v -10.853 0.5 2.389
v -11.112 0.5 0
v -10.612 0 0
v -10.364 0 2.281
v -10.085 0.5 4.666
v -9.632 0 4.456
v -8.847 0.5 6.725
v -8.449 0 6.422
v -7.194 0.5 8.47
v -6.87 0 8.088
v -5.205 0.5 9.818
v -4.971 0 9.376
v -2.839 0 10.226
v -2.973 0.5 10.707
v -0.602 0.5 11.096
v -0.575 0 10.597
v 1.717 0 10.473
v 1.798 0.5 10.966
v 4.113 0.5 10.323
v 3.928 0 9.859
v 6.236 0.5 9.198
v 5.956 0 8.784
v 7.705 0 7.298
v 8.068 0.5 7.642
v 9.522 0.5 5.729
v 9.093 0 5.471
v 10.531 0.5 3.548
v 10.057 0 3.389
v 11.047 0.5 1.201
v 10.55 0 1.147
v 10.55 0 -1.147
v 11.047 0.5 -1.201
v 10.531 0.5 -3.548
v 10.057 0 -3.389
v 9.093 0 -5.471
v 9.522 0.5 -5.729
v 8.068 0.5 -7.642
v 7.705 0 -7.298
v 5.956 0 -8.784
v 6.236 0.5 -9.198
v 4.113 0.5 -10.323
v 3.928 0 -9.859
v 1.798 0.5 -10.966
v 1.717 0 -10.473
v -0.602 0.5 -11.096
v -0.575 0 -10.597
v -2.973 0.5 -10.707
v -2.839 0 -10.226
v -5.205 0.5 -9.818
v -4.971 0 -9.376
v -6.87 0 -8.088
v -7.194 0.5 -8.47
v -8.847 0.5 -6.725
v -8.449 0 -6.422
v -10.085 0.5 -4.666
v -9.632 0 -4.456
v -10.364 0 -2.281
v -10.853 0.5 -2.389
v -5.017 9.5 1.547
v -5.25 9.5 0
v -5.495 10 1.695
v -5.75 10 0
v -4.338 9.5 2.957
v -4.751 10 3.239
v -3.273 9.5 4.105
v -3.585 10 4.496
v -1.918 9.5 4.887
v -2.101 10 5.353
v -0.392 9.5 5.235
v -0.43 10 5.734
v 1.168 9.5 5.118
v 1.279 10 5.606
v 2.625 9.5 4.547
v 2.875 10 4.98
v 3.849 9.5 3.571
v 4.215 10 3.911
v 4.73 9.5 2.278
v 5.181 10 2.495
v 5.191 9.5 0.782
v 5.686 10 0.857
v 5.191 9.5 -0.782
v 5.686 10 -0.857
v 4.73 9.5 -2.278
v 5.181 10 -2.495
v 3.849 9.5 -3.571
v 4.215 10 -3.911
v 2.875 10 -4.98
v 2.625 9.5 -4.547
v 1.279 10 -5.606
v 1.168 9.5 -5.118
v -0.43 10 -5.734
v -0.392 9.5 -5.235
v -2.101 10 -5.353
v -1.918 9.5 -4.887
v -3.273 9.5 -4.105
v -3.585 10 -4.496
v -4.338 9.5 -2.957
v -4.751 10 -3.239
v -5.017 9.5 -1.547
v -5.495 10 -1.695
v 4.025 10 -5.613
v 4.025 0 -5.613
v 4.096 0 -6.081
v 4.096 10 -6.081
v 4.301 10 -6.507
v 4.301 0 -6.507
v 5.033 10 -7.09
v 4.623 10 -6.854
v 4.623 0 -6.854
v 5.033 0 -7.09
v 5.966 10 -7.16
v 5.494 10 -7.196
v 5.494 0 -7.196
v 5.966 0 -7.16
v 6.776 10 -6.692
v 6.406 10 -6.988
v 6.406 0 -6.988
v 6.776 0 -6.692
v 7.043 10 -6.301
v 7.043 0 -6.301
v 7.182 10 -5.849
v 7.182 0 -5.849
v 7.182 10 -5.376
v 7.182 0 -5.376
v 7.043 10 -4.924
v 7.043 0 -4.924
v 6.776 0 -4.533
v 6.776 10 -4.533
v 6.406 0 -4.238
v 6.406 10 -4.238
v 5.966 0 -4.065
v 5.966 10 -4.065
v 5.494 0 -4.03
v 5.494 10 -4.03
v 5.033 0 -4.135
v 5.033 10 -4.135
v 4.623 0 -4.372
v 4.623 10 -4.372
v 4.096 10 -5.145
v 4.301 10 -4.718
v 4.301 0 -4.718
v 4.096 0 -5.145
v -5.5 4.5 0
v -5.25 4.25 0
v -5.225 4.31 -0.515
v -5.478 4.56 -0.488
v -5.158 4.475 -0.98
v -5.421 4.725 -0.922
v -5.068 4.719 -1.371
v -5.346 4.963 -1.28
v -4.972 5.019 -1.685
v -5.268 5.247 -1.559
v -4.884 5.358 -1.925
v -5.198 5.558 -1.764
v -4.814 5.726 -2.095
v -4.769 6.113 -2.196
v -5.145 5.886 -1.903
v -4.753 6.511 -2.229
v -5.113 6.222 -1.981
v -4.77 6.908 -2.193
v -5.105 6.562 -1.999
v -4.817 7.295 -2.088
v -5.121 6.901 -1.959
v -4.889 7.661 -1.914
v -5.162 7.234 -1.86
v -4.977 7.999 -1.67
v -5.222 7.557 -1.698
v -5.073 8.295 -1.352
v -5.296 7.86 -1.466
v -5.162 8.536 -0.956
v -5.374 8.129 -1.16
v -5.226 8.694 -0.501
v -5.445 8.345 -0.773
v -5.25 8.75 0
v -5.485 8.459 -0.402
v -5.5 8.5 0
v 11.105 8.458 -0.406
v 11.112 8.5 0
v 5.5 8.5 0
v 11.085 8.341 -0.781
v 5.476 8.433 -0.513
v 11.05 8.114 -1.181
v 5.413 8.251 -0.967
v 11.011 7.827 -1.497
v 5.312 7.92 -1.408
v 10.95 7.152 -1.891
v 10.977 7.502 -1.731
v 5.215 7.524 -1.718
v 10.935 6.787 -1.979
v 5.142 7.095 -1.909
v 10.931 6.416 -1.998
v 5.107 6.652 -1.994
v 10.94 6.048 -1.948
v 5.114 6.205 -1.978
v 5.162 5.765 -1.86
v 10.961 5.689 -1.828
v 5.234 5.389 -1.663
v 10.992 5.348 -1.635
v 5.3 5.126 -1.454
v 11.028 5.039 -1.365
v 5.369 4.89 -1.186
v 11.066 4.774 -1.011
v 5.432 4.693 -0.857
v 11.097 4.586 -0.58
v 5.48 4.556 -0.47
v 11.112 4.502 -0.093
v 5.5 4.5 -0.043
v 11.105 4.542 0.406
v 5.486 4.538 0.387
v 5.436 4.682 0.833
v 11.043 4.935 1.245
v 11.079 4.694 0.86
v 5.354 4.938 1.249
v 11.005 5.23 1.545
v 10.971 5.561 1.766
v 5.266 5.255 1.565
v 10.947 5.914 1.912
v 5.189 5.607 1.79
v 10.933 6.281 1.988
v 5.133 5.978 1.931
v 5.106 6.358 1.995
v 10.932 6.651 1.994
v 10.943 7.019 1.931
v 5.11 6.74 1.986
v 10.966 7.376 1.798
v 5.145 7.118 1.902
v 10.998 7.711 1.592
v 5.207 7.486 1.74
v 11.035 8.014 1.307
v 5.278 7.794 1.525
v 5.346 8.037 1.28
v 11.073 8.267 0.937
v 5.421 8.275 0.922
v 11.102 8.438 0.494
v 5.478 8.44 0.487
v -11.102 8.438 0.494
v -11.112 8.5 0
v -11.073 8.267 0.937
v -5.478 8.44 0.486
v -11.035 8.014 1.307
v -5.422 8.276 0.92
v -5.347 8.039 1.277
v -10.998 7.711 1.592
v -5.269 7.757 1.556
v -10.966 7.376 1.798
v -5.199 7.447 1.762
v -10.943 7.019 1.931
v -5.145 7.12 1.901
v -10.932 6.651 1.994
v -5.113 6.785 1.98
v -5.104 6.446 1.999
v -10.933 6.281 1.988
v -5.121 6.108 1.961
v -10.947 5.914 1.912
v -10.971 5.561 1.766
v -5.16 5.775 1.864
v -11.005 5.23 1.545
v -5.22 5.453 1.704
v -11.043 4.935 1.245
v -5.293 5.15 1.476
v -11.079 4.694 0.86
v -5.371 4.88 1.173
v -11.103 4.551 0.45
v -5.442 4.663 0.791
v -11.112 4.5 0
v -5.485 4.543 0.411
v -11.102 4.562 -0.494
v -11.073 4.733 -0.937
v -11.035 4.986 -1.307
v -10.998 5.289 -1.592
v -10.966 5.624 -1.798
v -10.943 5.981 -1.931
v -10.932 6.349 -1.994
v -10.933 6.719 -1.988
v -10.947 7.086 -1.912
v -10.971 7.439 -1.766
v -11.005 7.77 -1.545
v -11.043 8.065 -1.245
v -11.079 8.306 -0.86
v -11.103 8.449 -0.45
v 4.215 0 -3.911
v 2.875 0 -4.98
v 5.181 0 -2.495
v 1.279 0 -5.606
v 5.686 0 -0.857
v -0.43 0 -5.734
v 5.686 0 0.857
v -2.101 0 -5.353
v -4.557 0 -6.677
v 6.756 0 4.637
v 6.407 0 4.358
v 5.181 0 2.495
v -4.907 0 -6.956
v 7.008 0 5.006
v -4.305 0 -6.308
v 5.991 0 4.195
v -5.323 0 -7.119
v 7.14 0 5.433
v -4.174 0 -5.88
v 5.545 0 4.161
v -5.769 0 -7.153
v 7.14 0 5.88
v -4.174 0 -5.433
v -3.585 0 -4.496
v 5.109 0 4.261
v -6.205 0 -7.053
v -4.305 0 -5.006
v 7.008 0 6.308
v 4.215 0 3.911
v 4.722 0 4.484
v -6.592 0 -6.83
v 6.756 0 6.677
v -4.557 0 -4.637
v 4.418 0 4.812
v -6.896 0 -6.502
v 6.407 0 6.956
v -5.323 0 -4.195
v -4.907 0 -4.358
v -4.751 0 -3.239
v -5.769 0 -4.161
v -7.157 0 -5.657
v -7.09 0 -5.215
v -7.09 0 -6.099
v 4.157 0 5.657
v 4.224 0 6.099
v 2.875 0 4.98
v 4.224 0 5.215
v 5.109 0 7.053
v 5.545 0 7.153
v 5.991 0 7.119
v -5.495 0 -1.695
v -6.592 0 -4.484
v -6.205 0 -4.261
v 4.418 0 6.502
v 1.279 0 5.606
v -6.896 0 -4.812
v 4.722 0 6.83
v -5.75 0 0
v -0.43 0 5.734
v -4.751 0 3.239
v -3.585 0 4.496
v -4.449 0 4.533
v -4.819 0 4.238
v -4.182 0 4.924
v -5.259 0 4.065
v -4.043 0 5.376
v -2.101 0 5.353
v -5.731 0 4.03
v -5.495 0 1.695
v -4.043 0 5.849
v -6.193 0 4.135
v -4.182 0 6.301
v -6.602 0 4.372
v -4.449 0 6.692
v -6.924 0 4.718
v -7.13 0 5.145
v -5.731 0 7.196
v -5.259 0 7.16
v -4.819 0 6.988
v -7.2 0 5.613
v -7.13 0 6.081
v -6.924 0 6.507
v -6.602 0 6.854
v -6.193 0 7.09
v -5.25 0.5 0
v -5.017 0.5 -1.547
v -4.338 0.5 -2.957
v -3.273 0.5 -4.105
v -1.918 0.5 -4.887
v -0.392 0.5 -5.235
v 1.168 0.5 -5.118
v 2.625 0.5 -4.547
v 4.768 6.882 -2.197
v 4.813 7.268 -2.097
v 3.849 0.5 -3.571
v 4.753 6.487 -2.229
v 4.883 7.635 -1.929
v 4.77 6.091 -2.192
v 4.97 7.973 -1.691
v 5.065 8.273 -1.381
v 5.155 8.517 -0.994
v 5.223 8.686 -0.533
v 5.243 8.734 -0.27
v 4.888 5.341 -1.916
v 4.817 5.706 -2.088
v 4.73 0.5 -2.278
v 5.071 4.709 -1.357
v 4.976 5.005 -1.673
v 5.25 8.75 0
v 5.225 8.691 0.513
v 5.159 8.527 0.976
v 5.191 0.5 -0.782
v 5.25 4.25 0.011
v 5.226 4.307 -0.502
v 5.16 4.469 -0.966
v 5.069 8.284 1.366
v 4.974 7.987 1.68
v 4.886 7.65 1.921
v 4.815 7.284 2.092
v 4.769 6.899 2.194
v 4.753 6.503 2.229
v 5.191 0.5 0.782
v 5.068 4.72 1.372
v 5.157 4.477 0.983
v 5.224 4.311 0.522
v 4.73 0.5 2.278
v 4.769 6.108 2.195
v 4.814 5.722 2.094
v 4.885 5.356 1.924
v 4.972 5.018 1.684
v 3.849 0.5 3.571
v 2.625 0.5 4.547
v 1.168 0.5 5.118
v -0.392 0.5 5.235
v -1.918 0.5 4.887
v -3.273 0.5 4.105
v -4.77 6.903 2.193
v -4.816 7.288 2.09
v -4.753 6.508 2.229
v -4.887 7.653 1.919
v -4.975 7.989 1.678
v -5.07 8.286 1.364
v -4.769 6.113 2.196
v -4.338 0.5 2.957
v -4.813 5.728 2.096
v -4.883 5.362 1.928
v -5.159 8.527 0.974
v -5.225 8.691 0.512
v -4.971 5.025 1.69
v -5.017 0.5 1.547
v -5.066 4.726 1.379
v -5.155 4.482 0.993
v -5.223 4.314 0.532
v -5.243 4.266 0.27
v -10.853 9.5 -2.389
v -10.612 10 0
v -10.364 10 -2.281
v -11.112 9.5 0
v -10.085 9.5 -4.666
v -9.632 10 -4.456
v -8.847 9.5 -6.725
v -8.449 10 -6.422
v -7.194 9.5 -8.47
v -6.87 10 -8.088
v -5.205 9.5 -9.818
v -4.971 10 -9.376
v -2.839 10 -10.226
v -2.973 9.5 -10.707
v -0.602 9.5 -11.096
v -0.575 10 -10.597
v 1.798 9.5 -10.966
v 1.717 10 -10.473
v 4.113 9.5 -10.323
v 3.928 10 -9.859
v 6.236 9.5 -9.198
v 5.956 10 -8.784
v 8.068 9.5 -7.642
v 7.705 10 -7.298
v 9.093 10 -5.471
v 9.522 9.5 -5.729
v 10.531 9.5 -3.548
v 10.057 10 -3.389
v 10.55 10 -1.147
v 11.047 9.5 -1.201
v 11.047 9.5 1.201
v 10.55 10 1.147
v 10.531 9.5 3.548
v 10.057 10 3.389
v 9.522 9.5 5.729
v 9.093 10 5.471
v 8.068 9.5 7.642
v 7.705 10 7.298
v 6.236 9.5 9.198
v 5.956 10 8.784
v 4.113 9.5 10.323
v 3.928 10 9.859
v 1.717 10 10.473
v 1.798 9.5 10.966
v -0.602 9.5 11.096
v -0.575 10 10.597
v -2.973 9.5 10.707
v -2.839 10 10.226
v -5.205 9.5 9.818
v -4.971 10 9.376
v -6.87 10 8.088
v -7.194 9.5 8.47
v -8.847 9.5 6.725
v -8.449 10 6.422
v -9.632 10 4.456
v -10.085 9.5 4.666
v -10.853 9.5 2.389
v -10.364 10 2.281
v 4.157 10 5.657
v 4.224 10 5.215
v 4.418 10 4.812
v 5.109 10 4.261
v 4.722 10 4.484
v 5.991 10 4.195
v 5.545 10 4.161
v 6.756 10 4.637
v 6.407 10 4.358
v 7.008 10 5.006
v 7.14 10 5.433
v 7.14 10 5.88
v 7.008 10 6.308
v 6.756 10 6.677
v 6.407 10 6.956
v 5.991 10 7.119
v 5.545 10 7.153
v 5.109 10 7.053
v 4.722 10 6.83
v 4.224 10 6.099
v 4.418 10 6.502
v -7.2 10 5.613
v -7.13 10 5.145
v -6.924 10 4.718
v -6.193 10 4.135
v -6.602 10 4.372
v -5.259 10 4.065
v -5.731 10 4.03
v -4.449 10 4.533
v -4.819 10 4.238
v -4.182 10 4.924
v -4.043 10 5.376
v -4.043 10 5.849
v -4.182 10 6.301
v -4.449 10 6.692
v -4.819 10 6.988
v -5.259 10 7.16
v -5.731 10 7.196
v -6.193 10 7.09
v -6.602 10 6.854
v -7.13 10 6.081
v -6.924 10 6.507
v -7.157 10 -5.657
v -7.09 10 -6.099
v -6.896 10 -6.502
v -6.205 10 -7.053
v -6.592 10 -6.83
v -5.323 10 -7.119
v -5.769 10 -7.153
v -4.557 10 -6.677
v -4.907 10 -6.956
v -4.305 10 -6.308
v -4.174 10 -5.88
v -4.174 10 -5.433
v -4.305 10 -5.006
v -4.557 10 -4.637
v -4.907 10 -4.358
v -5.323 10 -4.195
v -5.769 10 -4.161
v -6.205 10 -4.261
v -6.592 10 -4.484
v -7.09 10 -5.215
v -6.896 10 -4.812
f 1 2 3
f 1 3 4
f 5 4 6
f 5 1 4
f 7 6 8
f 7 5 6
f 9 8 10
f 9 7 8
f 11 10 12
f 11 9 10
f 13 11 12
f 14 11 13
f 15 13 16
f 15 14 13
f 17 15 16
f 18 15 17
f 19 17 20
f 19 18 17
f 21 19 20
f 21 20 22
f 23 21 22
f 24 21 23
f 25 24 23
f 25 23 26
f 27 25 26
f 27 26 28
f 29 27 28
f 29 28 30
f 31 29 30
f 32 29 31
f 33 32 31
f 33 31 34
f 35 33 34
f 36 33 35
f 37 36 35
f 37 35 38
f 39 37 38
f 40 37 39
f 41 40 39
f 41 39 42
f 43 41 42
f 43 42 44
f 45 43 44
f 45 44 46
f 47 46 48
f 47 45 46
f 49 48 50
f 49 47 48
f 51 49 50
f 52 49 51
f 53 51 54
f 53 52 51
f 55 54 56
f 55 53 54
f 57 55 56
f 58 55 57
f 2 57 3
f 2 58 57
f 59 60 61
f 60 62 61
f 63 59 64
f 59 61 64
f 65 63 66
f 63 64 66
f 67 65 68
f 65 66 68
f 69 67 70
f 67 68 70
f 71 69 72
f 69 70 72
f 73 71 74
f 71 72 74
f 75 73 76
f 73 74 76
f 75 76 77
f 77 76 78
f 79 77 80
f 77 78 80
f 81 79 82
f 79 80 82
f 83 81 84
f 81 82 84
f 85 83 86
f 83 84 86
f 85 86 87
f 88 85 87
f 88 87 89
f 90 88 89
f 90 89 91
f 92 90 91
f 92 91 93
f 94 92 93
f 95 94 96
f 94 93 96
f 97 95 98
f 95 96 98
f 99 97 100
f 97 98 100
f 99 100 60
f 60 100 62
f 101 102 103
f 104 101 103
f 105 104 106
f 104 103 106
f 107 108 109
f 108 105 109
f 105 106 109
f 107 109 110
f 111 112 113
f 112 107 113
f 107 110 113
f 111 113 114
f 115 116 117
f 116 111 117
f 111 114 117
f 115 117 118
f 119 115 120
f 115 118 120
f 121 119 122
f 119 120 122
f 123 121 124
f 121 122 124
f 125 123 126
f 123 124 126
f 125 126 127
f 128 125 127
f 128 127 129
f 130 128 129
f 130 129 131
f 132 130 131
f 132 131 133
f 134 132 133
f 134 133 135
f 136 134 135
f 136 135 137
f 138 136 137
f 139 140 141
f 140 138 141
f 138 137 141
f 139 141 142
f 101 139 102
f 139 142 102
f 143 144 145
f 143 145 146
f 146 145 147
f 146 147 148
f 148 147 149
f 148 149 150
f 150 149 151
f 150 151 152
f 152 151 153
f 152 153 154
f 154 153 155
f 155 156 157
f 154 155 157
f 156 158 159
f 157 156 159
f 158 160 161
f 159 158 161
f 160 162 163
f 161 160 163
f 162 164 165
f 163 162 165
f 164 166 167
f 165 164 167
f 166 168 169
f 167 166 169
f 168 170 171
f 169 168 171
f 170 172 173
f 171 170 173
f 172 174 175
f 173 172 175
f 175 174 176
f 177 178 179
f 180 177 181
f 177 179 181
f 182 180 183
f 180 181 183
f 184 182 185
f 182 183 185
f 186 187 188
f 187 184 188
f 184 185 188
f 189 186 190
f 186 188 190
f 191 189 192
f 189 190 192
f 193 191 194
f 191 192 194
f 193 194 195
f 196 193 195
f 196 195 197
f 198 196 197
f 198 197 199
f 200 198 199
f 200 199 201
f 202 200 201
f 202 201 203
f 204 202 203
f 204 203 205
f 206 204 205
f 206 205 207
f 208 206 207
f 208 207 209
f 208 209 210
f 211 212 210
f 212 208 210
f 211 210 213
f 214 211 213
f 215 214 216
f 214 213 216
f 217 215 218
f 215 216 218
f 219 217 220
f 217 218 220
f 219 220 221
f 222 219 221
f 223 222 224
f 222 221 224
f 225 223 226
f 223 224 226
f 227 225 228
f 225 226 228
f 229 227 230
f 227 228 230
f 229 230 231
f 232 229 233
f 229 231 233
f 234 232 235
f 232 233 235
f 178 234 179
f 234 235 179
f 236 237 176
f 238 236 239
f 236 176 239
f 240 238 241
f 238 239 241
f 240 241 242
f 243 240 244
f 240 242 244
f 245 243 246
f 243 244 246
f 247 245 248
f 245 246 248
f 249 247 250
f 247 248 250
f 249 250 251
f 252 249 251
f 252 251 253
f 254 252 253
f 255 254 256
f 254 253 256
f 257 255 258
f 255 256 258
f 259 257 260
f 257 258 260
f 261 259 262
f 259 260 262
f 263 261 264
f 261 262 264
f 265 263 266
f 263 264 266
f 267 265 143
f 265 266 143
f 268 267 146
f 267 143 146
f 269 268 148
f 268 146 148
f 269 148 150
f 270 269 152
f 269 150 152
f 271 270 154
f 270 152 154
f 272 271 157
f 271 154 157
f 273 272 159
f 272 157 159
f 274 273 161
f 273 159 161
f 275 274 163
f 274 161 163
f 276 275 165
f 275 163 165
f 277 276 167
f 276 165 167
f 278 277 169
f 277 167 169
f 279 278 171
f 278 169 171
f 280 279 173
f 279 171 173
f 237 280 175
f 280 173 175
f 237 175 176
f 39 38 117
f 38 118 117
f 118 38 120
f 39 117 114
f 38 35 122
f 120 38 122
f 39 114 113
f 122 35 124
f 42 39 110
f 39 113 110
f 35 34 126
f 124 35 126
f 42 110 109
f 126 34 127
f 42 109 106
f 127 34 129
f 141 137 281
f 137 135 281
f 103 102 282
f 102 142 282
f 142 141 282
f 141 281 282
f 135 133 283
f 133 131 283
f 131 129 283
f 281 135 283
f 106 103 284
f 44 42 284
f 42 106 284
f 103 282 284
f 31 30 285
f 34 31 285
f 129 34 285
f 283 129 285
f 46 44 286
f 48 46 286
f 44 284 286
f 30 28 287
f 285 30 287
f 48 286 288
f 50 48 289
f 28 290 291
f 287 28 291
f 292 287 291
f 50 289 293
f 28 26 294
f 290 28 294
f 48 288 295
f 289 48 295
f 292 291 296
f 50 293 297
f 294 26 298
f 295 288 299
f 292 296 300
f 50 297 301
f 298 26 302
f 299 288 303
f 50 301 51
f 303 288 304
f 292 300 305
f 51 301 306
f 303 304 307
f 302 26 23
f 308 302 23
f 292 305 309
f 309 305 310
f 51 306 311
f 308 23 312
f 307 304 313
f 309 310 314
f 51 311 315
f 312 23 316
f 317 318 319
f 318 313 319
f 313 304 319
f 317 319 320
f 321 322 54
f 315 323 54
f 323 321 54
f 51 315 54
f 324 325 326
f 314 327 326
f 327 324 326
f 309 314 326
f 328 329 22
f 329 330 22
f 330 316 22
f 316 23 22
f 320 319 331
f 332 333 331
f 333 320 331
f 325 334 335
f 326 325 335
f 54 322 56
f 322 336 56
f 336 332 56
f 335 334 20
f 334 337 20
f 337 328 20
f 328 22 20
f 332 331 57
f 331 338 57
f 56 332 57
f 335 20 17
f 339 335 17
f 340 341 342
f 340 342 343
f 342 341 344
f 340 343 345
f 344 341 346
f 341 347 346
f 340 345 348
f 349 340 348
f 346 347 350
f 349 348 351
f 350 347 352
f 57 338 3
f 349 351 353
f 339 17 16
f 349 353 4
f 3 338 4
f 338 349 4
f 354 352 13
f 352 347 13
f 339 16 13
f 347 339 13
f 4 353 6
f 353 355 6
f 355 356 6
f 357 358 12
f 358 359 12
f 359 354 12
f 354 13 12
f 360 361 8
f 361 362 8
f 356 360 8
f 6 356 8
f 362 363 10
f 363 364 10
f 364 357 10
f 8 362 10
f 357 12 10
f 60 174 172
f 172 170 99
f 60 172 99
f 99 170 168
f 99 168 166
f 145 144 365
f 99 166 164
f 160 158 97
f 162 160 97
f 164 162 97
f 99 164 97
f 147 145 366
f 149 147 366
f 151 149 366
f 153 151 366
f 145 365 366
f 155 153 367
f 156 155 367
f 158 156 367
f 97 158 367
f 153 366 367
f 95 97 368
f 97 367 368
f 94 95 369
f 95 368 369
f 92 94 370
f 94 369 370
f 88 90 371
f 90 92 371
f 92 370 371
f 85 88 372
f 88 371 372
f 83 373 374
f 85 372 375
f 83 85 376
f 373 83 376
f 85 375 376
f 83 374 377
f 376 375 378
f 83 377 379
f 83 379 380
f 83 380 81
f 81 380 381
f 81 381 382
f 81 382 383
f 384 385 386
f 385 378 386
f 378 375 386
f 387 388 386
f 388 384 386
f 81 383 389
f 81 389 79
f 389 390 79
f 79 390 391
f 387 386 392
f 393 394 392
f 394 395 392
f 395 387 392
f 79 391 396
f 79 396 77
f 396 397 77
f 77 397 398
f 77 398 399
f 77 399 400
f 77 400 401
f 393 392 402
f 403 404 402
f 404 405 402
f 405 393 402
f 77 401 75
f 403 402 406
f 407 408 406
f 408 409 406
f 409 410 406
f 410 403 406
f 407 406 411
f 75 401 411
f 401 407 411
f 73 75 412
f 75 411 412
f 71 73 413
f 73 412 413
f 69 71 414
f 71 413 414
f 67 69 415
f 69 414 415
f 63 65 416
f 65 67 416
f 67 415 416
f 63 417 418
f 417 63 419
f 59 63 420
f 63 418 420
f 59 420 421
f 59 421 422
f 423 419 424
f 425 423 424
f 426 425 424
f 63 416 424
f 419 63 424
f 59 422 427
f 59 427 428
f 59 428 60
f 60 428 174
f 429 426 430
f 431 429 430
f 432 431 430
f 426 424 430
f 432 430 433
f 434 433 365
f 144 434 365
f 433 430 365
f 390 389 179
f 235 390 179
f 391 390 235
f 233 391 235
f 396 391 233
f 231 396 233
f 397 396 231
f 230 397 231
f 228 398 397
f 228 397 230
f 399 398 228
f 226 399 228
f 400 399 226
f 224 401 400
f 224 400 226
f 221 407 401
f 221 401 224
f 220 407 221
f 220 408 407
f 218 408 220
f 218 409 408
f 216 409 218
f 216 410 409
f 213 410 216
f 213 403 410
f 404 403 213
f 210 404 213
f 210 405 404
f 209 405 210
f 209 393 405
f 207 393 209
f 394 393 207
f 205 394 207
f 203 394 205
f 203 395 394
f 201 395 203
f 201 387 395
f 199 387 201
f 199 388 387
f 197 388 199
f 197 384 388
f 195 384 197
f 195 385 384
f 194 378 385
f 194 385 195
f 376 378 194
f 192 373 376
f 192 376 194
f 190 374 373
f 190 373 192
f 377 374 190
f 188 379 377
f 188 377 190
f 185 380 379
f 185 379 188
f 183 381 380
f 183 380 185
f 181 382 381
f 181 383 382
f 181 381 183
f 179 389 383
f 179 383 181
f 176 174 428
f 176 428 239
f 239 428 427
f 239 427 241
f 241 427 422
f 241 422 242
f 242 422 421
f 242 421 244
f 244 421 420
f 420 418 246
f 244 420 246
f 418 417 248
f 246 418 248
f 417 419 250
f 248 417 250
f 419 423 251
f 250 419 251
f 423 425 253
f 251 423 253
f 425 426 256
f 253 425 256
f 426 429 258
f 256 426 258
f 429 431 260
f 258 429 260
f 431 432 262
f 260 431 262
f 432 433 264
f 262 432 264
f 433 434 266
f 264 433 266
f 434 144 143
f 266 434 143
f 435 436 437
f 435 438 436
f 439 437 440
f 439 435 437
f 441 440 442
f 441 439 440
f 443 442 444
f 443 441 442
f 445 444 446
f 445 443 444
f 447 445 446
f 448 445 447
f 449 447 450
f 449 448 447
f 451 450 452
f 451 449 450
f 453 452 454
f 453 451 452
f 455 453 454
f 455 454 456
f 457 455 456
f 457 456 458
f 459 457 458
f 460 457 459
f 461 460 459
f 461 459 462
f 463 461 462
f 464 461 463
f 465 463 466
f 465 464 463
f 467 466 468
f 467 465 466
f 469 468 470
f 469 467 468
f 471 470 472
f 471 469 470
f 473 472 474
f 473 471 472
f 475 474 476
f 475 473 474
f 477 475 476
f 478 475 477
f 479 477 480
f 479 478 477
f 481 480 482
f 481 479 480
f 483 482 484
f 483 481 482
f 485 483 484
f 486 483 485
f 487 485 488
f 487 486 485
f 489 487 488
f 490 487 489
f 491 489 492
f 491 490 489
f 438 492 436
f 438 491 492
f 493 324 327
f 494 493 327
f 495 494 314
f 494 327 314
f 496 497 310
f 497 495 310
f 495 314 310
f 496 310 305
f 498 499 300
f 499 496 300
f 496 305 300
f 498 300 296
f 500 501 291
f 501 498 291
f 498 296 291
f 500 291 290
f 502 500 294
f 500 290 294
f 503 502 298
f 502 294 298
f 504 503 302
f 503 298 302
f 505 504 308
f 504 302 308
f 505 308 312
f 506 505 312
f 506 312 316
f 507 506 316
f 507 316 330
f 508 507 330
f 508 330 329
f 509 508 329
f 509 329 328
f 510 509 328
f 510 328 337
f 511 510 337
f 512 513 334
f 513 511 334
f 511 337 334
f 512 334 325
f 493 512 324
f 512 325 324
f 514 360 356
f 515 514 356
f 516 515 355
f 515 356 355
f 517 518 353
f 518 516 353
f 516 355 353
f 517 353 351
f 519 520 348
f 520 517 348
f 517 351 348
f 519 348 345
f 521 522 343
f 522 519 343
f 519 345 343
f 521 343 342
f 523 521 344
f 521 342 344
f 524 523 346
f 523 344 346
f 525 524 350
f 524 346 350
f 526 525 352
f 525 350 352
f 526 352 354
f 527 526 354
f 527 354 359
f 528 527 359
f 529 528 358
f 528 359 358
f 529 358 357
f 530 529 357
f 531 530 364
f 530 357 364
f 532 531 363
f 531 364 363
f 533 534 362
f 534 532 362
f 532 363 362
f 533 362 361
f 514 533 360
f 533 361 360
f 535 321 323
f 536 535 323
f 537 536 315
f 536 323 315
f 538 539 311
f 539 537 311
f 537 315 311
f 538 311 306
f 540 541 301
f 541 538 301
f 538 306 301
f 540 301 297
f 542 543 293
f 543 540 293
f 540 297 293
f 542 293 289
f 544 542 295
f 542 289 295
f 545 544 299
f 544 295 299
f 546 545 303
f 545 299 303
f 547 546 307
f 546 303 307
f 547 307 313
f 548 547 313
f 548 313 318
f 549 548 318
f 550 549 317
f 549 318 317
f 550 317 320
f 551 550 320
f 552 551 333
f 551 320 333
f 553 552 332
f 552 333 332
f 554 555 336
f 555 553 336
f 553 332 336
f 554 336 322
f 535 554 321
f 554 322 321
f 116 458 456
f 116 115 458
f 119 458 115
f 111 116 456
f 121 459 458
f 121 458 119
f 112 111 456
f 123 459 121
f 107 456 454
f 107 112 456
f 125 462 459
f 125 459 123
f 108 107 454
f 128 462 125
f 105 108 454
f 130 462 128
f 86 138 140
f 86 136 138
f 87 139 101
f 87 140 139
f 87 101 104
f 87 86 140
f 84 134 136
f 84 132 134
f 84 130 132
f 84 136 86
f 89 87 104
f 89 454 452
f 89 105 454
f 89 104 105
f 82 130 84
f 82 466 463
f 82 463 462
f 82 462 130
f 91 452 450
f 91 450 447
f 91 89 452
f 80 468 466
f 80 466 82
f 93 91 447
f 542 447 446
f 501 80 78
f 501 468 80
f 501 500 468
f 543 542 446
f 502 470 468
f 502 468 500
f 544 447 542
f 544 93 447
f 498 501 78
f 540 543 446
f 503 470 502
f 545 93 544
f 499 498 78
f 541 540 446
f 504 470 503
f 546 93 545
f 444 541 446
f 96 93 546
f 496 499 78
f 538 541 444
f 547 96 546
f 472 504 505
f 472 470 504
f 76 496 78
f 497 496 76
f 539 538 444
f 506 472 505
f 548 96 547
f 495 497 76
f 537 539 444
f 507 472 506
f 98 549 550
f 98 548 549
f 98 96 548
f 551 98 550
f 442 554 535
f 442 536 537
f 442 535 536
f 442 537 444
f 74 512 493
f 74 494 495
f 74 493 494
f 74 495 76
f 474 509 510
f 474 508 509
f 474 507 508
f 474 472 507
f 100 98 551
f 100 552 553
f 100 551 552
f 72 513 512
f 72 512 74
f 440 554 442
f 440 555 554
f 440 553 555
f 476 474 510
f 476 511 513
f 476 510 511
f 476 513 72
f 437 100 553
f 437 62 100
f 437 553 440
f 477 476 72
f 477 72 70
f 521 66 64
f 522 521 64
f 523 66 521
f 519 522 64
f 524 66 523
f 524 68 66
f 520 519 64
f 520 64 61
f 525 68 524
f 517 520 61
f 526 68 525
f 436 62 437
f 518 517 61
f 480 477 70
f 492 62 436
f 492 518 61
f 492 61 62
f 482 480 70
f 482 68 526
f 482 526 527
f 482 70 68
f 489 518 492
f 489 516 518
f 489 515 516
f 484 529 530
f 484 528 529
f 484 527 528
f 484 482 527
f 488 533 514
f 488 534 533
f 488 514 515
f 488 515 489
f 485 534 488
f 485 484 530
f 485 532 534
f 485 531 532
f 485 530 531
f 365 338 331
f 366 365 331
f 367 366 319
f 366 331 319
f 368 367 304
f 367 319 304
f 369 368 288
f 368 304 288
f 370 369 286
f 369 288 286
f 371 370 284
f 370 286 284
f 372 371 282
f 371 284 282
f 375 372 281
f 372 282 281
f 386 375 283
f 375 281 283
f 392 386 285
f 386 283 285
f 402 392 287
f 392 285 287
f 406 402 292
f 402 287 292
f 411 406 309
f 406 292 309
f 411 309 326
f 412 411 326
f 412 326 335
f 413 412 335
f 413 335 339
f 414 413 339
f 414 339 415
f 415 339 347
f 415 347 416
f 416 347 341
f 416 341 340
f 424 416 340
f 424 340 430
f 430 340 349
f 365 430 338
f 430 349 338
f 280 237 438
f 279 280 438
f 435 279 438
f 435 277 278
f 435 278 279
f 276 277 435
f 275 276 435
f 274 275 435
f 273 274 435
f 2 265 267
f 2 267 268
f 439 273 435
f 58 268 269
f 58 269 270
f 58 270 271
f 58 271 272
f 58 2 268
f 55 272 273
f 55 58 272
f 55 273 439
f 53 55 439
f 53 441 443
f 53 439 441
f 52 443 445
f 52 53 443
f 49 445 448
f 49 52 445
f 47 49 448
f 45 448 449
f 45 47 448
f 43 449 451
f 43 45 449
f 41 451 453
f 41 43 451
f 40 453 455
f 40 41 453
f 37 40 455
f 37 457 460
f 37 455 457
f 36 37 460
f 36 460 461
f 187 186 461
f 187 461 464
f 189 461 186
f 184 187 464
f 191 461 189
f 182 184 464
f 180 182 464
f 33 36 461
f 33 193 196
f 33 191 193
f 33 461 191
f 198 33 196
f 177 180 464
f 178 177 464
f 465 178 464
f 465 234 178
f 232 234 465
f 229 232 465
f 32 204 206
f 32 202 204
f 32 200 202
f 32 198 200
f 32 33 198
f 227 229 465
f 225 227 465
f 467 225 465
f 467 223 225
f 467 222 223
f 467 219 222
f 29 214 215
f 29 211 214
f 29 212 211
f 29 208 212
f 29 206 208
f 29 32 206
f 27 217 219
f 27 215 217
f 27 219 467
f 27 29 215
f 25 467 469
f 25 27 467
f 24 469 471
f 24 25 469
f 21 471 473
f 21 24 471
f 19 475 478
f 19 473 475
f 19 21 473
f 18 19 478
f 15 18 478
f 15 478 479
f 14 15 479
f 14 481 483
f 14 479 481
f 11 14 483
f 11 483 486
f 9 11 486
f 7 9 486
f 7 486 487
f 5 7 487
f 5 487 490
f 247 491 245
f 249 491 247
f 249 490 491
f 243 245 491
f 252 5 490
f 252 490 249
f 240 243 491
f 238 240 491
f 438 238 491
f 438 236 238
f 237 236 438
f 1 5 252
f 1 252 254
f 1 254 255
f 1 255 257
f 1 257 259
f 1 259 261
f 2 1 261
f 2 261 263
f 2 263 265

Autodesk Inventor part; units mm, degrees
ref_plane "YZ Plane" through (0, 0, 0) normal (1, 0, 0) x (0, 1, 0)
ref_plane "XZ Plane" through (0, 0, 0) normal (0, 1, 0) x (-1, 0, 0)
ref_plane "XY Plane" through (0, 0, 0) normal (0, 0, 1) x (1, 0, 0)
sketch "Sketch1" plane through (0, 0, 0) normal (0, 1, 0) x (-1, 0, 0)
  circle A0 centre (0, 0) radius 11.1125
  circle A1 centre (0, 0) radius 8 construction
  line L0 (0, 0) -> (0, -8) construction
  line L1 (0, 0) -> (5.6569, -5.6569) construction
  circle A2 centre (5.6569, -5.6569) radius 1.5
  circle A3 centre (-5.6569, 5.6569) radius 1.5
  circle A4 centre (0, 0) radius 5.25
  circle A5 centre (0, 0) radius 7.9375 construction
  line L2 (0, 0) -> (-5.6127, -5.6127) construction
  circle A6 centre (-5.6127, -5.6127) radius 1.5875
  circle A7 centre (5.6127, 5.6127) radius 1.5875
  dimension "d21" = 15.875
  dimension "d0" = 22.225
  dimension "d1" = 16
  dimension "d2" = 45
  dimension "d3" = 3
  dimension "d6" = 360
  dimension "d8" = 10.5
  dimension "d22" = 3.175
  dimension "d25" = 360
extrude "Extrusion1" add sketch "Sketch1" along normal blind 10
sketch "Sketch2" plane through (0, 0, 0) normal (1, 0, 0) x (0, 1, 0)
  line L0 (10, -11.1125) -> (10, 11.1125) projected
  line L1 (10, 0) -> (0, 0) construction
  circle A0 centre (6.5, 0) radius 2
  line L2 (0, -11.1125) -> (0, 11.1125) projected
  dimension "d11" = 4
  dimension "d12" = 6.5
extrude "Extrusion2" cut sketch "Sketch2" along normal through all both and the other way through all
chamfer "Chamfer1" distance 0.5 angle 45 2 edges at (5.25, 0, 0) (5.25, 10, 0)
chamfer "Chamfer2" distance 0.5 angle 45 2 edges at (11.1125, 10, 0) (11.1125, 0, 0)
chamfer "Chamfer3" distance 0.25 angle 45 3 edges at (-4.8541, 6.5004, 2) (-4.8541, 6.4996, -2) (5.25, 4.5, 0.0002)
properties part number "Hub Adapter" material "Nylon 6/6"
